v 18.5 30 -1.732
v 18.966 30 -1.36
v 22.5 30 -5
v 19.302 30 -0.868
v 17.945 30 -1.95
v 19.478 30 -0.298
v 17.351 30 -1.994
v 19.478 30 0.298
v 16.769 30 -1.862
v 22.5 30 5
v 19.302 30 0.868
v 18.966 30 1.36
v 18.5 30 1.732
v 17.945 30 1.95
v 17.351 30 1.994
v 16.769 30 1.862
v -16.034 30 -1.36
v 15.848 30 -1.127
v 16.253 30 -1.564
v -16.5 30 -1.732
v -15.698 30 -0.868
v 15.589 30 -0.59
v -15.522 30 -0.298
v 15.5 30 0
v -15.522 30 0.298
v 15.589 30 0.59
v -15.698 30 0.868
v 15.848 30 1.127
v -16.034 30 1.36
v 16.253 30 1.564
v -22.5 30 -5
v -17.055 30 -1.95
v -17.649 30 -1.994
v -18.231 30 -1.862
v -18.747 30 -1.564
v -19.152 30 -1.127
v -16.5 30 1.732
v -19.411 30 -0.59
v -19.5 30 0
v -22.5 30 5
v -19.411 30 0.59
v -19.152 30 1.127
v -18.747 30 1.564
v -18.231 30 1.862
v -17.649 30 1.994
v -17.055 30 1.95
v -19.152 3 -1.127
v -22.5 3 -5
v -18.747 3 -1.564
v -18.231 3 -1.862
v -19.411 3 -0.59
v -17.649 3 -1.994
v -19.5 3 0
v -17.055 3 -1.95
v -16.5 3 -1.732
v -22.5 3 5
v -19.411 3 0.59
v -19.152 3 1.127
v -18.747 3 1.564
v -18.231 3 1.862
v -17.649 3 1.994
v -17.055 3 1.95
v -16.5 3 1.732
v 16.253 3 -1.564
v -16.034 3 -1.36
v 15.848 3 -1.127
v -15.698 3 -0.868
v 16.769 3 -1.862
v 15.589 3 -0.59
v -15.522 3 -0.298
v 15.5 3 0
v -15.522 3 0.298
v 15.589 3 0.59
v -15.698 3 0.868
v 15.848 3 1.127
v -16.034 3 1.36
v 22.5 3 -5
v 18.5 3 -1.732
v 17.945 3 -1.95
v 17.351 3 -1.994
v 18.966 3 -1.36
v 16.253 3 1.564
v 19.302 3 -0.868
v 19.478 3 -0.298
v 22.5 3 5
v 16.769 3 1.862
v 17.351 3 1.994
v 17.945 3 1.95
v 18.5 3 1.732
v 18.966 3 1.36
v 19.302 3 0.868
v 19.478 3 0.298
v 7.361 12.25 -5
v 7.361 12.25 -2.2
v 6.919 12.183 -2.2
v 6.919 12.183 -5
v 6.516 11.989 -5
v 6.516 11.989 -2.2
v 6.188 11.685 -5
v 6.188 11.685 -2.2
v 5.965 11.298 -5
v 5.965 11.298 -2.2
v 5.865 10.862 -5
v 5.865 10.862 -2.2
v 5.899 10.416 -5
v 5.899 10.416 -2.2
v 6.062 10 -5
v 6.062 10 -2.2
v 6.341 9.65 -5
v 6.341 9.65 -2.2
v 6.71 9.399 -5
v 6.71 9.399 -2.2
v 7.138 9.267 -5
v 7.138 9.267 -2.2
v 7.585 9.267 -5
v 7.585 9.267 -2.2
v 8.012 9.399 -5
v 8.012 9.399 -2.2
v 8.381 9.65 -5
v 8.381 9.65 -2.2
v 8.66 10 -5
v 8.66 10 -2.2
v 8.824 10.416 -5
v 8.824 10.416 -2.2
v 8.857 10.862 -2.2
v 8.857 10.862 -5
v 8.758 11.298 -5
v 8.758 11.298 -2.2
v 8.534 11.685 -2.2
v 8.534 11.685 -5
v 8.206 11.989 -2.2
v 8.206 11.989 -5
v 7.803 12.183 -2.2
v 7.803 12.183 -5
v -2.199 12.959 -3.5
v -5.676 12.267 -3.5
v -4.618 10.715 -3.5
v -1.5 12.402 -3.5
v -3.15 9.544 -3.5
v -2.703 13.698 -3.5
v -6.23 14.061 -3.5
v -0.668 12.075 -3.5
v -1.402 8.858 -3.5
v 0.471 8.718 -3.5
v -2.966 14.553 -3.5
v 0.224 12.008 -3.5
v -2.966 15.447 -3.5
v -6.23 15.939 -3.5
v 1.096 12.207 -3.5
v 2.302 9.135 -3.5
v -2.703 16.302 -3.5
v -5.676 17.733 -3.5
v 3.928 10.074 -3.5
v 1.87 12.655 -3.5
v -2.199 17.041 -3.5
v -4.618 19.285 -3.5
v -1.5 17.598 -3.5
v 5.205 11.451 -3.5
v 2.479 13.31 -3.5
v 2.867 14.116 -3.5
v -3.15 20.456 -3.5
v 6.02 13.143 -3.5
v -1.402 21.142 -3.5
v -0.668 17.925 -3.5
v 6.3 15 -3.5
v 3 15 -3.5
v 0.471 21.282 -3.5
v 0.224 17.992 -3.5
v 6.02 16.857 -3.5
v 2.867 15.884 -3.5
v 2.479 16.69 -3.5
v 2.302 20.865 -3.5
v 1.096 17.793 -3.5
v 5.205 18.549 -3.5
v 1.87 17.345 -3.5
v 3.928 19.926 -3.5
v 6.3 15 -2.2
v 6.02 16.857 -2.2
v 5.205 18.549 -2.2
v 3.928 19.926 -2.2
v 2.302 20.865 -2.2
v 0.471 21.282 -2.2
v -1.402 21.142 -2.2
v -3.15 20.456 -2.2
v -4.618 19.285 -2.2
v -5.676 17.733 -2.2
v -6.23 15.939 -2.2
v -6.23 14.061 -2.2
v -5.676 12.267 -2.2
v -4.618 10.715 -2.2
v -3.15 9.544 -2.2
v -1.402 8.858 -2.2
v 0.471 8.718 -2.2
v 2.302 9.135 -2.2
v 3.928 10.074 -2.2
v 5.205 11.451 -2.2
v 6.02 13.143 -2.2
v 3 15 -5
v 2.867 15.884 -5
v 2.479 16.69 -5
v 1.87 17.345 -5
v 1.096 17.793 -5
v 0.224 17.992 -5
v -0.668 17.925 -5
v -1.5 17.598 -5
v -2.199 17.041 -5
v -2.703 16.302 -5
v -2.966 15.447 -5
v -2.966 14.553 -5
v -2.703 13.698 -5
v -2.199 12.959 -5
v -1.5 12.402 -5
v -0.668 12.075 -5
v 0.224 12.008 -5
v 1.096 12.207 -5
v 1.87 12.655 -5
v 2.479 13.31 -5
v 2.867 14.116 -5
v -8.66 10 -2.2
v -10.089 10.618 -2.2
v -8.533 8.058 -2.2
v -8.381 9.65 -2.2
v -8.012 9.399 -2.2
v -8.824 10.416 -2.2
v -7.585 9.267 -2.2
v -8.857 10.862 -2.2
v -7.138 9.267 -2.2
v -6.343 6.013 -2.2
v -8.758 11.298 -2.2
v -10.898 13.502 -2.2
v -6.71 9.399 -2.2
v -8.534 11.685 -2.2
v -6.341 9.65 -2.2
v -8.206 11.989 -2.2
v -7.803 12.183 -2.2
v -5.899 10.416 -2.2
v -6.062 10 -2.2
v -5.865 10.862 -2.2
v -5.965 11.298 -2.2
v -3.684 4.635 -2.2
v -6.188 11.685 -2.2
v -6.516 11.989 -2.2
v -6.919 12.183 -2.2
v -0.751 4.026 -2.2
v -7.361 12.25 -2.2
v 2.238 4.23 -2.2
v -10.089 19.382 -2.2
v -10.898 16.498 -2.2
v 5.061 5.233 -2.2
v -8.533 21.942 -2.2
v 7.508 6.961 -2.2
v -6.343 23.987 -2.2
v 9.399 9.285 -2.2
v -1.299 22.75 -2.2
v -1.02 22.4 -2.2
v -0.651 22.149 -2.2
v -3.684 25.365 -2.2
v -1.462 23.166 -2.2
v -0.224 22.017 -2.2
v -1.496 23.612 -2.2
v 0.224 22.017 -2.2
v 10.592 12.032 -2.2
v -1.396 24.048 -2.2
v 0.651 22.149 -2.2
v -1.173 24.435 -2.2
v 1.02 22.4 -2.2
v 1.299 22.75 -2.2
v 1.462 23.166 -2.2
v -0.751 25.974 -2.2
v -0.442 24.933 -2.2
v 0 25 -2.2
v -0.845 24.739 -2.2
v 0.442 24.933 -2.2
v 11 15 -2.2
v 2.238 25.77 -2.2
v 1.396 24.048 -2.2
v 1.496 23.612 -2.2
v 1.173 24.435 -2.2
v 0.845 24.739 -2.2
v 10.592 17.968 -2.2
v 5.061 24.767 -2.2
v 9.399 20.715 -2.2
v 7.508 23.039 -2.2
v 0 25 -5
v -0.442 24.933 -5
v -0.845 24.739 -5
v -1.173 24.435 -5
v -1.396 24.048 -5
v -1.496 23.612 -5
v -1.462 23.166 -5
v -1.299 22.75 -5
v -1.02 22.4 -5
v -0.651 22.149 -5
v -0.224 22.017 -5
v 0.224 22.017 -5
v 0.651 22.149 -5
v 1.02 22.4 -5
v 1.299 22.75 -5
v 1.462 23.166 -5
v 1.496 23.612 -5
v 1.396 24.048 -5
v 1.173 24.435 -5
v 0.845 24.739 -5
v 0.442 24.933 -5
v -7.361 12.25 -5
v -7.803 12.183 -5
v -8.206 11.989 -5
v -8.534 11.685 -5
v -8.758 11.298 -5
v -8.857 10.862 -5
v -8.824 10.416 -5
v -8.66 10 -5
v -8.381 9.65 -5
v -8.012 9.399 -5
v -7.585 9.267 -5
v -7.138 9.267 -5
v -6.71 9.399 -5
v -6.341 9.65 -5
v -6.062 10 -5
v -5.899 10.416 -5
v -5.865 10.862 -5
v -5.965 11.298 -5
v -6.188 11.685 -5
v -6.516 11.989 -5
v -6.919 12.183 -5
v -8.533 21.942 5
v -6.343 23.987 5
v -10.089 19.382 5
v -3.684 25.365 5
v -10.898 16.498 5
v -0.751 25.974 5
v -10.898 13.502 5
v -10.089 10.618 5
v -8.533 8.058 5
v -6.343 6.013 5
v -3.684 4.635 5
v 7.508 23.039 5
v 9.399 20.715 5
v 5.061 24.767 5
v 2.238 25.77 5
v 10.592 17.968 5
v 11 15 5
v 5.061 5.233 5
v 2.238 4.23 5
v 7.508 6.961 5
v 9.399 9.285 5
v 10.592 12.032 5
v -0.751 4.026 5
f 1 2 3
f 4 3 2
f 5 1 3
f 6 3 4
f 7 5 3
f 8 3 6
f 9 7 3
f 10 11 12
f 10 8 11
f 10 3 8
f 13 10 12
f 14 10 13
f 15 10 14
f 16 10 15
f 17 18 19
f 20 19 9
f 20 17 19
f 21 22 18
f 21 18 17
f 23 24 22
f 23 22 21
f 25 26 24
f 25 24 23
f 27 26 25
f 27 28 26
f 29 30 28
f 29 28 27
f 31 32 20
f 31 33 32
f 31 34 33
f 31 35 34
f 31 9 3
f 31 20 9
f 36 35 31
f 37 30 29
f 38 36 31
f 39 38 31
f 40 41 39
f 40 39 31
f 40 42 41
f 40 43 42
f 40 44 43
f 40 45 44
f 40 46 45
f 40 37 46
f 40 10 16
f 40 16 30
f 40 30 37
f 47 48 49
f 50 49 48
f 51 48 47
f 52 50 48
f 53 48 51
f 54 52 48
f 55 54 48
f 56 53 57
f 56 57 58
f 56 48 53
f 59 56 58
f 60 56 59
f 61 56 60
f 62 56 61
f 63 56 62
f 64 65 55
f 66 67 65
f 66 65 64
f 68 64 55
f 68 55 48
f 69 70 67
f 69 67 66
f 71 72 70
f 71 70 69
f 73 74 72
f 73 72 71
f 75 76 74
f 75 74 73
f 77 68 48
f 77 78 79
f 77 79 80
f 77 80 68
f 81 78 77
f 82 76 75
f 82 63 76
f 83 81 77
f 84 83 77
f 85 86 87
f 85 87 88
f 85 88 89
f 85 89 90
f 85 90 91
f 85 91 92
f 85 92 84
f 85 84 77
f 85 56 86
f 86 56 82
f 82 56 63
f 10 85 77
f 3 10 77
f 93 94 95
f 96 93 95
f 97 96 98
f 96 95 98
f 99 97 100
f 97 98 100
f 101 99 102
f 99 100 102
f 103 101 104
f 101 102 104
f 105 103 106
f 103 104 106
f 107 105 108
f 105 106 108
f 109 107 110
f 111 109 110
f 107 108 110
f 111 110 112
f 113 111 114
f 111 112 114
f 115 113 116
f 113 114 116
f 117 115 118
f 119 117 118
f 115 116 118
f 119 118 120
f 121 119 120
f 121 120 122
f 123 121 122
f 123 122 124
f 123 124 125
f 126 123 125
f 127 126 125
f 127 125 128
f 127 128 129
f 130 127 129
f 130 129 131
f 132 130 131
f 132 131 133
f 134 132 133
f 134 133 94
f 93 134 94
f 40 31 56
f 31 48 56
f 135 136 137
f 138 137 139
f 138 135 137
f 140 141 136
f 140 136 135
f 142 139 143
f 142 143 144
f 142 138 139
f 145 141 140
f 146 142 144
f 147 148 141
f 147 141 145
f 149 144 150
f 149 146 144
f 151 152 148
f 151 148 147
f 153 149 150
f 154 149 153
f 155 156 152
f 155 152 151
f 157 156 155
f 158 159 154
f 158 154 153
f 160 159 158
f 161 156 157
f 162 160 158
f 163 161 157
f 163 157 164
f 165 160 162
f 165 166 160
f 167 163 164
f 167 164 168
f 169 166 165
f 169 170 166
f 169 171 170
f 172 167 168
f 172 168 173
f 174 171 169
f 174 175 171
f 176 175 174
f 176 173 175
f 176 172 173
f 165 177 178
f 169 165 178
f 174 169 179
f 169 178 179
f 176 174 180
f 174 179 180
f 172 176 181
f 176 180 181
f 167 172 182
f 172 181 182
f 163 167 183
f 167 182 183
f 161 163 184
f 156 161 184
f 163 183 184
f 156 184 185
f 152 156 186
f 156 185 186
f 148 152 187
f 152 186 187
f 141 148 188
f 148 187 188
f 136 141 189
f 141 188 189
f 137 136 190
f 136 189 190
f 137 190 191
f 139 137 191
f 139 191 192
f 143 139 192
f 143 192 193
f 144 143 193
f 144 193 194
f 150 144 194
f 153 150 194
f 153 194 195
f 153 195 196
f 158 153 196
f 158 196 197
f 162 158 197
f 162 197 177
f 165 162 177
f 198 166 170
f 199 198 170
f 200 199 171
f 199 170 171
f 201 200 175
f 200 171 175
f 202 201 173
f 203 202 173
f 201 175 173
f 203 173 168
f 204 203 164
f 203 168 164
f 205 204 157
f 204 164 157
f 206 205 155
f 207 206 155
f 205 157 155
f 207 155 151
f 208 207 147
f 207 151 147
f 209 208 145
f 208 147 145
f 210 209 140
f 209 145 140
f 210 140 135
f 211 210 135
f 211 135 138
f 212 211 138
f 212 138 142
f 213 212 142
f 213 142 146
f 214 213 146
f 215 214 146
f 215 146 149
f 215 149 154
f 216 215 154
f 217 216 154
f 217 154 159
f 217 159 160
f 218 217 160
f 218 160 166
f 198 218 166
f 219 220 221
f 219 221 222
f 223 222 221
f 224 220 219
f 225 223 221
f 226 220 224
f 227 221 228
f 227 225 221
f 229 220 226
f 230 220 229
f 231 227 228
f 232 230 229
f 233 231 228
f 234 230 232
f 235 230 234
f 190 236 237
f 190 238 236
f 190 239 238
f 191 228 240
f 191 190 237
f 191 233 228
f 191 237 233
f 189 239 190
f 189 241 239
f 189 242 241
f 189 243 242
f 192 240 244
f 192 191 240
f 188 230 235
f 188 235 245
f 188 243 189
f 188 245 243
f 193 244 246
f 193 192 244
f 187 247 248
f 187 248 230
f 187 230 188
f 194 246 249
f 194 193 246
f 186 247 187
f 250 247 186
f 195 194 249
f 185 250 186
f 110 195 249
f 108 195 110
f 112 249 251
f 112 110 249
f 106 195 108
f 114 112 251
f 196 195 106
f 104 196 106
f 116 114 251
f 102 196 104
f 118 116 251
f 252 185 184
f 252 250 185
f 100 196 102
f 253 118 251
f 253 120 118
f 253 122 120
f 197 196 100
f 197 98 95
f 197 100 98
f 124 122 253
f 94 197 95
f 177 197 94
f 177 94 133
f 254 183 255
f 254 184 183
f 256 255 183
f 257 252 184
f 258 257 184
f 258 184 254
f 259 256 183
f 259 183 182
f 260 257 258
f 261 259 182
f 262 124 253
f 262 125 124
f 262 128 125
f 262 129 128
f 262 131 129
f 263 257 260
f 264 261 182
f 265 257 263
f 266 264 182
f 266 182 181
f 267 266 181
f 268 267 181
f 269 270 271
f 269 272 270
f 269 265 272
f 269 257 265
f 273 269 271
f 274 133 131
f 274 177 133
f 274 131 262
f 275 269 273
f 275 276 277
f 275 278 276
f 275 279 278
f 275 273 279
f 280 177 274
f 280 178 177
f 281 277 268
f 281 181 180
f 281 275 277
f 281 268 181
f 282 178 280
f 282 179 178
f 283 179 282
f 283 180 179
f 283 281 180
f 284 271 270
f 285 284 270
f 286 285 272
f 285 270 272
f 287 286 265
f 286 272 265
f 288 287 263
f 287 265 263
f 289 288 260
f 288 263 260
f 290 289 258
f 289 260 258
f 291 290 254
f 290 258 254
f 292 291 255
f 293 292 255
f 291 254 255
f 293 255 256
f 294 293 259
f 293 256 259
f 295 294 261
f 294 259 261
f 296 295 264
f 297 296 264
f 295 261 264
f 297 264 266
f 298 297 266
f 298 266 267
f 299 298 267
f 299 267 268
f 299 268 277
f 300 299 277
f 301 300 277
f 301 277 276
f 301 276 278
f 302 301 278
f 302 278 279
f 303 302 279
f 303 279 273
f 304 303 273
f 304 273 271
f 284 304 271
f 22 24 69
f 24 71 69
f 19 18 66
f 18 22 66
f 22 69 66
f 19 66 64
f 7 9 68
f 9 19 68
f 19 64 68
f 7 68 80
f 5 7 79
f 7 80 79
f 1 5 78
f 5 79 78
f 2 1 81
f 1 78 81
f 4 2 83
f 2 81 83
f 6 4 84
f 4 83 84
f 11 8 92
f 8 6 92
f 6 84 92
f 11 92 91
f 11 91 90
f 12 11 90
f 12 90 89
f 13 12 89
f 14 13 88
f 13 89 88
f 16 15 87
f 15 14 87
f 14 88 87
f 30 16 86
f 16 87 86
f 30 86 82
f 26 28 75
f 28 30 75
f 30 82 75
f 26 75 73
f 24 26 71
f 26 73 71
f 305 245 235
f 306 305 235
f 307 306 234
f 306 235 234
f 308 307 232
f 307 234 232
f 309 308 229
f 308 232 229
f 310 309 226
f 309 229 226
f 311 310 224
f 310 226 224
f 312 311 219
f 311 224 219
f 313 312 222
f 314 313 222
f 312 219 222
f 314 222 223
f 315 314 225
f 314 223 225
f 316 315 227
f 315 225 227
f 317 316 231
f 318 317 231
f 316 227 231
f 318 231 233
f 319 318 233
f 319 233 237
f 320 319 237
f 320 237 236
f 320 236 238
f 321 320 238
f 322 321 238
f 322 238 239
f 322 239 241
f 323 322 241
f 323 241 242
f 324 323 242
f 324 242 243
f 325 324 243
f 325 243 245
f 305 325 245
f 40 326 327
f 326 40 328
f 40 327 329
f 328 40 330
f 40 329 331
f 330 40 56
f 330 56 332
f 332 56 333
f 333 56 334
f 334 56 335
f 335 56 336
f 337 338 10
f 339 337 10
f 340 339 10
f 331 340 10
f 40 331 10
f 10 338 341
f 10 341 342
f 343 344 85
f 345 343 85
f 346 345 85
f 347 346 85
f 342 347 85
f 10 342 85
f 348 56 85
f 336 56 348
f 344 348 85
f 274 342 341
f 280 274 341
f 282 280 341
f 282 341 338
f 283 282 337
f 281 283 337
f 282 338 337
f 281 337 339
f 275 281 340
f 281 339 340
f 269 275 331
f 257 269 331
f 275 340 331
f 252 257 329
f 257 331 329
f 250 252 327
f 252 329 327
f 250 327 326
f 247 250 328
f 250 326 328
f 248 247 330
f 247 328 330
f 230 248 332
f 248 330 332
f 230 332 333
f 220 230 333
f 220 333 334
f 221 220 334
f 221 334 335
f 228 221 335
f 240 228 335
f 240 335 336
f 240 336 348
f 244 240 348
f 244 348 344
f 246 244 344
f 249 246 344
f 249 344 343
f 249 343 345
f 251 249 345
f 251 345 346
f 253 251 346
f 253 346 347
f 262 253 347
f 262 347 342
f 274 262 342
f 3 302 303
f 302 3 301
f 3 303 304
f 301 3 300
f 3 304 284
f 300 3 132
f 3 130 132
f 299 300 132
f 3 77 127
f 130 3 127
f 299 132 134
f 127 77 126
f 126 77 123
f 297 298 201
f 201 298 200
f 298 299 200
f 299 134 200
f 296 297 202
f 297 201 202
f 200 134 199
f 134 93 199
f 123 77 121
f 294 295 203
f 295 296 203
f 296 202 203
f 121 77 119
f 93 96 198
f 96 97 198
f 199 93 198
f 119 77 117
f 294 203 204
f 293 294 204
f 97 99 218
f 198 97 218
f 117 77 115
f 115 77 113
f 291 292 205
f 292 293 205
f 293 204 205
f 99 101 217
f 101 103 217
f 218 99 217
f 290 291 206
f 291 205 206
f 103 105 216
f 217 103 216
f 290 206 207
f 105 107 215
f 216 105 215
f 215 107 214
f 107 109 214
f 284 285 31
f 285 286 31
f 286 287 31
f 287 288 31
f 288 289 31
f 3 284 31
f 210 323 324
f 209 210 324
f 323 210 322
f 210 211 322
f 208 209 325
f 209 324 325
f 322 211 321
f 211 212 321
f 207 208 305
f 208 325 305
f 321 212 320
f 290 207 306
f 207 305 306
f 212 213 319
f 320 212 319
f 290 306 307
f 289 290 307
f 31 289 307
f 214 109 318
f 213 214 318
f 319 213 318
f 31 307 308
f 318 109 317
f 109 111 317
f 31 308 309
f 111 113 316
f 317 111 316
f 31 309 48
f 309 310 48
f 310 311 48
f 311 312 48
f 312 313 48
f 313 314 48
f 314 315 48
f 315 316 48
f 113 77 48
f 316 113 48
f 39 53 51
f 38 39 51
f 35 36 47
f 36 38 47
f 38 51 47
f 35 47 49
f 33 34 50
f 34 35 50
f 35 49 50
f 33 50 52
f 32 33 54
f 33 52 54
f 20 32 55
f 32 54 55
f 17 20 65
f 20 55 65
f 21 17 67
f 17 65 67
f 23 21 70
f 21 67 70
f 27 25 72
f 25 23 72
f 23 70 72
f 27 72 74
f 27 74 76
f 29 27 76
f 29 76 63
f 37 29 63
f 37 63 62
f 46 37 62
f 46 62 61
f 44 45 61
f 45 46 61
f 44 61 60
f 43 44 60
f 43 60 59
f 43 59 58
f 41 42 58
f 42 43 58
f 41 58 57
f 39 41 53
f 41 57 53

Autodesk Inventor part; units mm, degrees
ref_plane "YZ Plane" through (0, 0, 0) normal (1, 0, 0) x (0, 1, 0)
ref_plane "XZ Plane" through (0, 0, 0) normal (0, 1, 0) x (-1, 0, 0)
ref_plane "XY Plane" through (0, 0, 0) normal (0, 0, 1) x (1, 0, 0)
sketch "Sketch1" plane through (0, 0, 0) normal (0, 1, 0) x (-1, 0, 0)
  line L0 (22.5, 5) -> (-22.5, 5)
  line L1 (-22.5, 5) -> (-22.5, -5)
  line L2 (-22.5, -5) -> (22.5, -5)
  line L3 (22.5, -5) -> (22.5, 5)
  line L4 (22.5, 5) -> (-22.5, -5) construction
  line L5 (-22.5, 5) -> (22.5, -5) construction
  line L6 (0, 0) -> (17.5, 0) construction
  line L7 (0, 0) -> (-17.5, 0) construction
  circle A0 centre (17.5, 0) radius 2
  circle A1 centre (-17.5, 0) radius 2
  line L8 (22.5, 5) -> (17.5, 5)
  line L9 (17.5, 5) -> (17.5, 0) construction
  dimension "d0" = 45
  dimension "d1" = 10
  dimension "d2" = 17.5
  dimension "d3" = 17.5
  dimension "d4" = 4
  dimension "d5" = 4
extrude "Extrusion1" add sketch "Sketch1" along normal blind 30
sketch "Sketch2" plane through (0, 0, 0) normal (0, -1, 0) x (1, 0, 0)
  line L0 (-22.5, -5) -> (-22.5, 5) projected
  line L1 (22.5, -5) -> (-22.5, -5) projected
  line L2 (-22.5, 5) -> (22.5, 5)
  line L3 (22.5, 5) -> (22.5, -5)
  line L4 (22.5, -5) -> (-22.5, -5)
  line L5 (-22.5, -5) -> (-22.5, 5)
  circle A0 centre (-17.5, 0) radius 2 projected
  circle A1 centre (-17.5, 0) radius 1.6
  circle A2 centre (17.5, 0) radius 2 projected
  circle A3 centre (17.5, 0) radius 1.6
sketch "Sketch3" plane through (-22.5, 0, 5) normal (0, 0, 1) x (1, 0, 0)
  line L0 (45, 30) -> (0, 30) construction
  line L1 (0, 30) -> (45, 0) construction
  line L2 (45, 0) -> (0, 0) construction
  line L3 (45, 30) -> (0, 0) construction
  circle A0 centre (22.5, 15) radius 3
  circle A1 centre (22.5, 15) radius 7.5 construction
  circle A2 centre (22.5, 22.5) radius 1.1
  circle A3 centre (16.0048, 11.25) radius 1.1
  circle A4 centre (28.9952, 11.25) radius 1.1
  point P0 (22.5, 0)
  dimension "d9" = 15
  dimension "d8" = 6
  dimension "d10" = 2.2
  dimension "d13" = 360
extrude "Extrusion2" cut sketch "Sketch3" against normal blind 30 contours A0
sketch "Sketch4" plane through (-22.5, 0, 5) normal (0, 0, 1) x (1, 0, 0)
  line L0 (45, 0) -> (45, 30) construction
  line L1 (0, 30) -> (45, 0) construction
  line L2 (45, 30) -> (0, 30) construction
  line L3 (0, 0) -> (45, 30) construction
  circle A0 centre (22.5, 15) radius 6.3
  point P0 (22.5, 0)
  dimension "d17" = 12.6
extrude "Extrusion3" cut sketch "Sketch4" against normal blind 8.5
sketch "Sketch5" plane through (-22.5, 0, 5) normal (0, 0, 1) x (1, 0, 0)
  line L0 (0, 0) -> (0, 30) construction
  line L1 (0, 0) -> (45, 0) construction
  line L2 (0, 30) -> (45, 0) construction
  line L3 (0, 30) -> (45, 30) construction
  line L4 (45, 30) -> (0, 0) construction
  circle A0 centre (22.5, 15) radius 11
  point P0 (22.5, 0)
  dimension "d20" = 22
extrude "Extrusion4" cut sketch "Sketch5" against normal blind 7.2
extrude "Extrusion5" cut sketch "Sketch2" against normal blind 3 contours L0 L2 L3 L1
sketch "Sketch6" plane through (22.5, 30, -5) normal (0, 0, -1) x (-1, 0, 0)
  circle A0 centre (22.5, -15) radius 3 projected
  circle A1 centre (22.5, -15) radius 8.5 construction
  point P0 (22.5, -30)
  point P1 (22.5, -6.5)
  point P2 (15.1388, -19.25)
  point P3 (29.8612, -19.25)
  dimension "d25" = 17
  dimension "d28" = 360
hole "Bohrung2" at (0, 15, -5) at (7.3612, 10.75, -5) at (-7.3612, 10.75, -5) at (0, 23.5, -5) direction (0, 0, 1) diameter 3 end through all
properties part number "MotorBracket"
